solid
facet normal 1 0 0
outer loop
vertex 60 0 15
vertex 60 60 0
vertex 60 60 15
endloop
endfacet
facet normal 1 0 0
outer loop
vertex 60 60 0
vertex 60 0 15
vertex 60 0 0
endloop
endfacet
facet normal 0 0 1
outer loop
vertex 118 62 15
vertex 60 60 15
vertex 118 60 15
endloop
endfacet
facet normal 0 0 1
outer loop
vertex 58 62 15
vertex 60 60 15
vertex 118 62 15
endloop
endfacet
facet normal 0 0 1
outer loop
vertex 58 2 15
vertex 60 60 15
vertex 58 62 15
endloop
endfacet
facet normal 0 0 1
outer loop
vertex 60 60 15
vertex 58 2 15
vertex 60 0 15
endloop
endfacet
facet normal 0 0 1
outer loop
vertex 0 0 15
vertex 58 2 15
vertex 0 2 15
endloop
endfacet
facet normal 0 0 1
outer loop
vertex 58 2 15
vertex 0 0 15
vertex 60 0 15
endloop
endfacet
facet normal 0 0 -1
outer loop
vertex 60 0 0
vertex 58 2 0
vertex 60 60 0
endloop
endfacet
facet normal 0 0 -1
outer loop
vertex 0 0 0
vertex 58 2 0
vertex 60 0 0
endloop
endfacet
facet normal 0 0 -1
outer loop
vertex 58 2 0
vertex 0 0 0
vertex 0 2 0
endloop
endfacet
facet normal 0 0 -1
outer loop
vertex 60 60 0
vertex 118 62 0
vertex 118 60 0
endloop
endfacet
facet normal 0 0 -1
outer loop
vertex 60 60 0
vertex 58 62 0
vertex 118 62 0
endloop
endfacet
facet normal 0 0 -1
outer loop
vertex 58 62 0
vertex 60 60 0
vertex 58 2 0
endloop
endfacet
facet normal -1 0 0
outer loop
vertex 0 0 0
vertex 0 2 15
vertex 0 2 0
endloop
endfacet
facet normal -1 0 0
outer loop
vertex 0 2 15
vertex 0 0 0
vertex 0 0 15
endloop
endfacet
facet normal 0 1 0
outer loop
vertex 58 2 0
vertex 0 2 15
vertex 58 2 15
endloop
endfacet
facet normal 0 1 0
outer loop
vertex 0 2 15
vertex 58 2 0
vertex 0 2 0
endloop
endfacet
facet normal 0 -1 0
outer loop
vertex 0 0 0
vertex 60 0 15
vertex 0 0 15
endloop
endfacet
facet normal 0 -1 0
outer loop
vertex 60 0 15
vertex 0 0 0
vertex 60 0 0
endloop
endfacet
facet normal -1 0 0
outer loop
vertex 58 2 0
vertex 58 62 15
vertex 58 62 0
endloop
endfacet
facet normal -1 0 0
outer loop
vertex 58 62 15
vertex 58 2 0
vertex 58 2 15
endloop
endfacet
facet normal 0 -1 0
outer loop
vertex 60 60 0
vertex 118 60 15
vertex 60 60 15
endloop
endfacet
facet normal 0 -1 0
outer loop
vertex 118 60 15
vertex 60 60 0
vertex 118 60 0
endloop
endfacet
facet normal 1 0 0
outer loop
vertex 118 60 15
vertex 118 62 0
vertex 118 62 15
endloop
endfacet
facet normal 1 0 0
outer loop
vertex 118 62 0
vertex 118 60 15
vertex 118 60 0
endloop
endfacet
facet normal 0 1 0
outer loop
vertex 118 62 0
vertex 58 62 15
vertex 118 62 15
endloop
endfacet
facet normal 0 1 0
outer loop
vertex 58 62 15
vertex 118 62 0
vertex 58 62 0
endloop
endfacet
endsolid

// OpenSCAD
length=60;
width=2;
height=15;
module myCube() {
cube([length,width,height]);
}
myCube();
translate([60,0,0])
    rotate([0,0,90])
        myCube();
translate([60-width,60,0])
    myCube();
